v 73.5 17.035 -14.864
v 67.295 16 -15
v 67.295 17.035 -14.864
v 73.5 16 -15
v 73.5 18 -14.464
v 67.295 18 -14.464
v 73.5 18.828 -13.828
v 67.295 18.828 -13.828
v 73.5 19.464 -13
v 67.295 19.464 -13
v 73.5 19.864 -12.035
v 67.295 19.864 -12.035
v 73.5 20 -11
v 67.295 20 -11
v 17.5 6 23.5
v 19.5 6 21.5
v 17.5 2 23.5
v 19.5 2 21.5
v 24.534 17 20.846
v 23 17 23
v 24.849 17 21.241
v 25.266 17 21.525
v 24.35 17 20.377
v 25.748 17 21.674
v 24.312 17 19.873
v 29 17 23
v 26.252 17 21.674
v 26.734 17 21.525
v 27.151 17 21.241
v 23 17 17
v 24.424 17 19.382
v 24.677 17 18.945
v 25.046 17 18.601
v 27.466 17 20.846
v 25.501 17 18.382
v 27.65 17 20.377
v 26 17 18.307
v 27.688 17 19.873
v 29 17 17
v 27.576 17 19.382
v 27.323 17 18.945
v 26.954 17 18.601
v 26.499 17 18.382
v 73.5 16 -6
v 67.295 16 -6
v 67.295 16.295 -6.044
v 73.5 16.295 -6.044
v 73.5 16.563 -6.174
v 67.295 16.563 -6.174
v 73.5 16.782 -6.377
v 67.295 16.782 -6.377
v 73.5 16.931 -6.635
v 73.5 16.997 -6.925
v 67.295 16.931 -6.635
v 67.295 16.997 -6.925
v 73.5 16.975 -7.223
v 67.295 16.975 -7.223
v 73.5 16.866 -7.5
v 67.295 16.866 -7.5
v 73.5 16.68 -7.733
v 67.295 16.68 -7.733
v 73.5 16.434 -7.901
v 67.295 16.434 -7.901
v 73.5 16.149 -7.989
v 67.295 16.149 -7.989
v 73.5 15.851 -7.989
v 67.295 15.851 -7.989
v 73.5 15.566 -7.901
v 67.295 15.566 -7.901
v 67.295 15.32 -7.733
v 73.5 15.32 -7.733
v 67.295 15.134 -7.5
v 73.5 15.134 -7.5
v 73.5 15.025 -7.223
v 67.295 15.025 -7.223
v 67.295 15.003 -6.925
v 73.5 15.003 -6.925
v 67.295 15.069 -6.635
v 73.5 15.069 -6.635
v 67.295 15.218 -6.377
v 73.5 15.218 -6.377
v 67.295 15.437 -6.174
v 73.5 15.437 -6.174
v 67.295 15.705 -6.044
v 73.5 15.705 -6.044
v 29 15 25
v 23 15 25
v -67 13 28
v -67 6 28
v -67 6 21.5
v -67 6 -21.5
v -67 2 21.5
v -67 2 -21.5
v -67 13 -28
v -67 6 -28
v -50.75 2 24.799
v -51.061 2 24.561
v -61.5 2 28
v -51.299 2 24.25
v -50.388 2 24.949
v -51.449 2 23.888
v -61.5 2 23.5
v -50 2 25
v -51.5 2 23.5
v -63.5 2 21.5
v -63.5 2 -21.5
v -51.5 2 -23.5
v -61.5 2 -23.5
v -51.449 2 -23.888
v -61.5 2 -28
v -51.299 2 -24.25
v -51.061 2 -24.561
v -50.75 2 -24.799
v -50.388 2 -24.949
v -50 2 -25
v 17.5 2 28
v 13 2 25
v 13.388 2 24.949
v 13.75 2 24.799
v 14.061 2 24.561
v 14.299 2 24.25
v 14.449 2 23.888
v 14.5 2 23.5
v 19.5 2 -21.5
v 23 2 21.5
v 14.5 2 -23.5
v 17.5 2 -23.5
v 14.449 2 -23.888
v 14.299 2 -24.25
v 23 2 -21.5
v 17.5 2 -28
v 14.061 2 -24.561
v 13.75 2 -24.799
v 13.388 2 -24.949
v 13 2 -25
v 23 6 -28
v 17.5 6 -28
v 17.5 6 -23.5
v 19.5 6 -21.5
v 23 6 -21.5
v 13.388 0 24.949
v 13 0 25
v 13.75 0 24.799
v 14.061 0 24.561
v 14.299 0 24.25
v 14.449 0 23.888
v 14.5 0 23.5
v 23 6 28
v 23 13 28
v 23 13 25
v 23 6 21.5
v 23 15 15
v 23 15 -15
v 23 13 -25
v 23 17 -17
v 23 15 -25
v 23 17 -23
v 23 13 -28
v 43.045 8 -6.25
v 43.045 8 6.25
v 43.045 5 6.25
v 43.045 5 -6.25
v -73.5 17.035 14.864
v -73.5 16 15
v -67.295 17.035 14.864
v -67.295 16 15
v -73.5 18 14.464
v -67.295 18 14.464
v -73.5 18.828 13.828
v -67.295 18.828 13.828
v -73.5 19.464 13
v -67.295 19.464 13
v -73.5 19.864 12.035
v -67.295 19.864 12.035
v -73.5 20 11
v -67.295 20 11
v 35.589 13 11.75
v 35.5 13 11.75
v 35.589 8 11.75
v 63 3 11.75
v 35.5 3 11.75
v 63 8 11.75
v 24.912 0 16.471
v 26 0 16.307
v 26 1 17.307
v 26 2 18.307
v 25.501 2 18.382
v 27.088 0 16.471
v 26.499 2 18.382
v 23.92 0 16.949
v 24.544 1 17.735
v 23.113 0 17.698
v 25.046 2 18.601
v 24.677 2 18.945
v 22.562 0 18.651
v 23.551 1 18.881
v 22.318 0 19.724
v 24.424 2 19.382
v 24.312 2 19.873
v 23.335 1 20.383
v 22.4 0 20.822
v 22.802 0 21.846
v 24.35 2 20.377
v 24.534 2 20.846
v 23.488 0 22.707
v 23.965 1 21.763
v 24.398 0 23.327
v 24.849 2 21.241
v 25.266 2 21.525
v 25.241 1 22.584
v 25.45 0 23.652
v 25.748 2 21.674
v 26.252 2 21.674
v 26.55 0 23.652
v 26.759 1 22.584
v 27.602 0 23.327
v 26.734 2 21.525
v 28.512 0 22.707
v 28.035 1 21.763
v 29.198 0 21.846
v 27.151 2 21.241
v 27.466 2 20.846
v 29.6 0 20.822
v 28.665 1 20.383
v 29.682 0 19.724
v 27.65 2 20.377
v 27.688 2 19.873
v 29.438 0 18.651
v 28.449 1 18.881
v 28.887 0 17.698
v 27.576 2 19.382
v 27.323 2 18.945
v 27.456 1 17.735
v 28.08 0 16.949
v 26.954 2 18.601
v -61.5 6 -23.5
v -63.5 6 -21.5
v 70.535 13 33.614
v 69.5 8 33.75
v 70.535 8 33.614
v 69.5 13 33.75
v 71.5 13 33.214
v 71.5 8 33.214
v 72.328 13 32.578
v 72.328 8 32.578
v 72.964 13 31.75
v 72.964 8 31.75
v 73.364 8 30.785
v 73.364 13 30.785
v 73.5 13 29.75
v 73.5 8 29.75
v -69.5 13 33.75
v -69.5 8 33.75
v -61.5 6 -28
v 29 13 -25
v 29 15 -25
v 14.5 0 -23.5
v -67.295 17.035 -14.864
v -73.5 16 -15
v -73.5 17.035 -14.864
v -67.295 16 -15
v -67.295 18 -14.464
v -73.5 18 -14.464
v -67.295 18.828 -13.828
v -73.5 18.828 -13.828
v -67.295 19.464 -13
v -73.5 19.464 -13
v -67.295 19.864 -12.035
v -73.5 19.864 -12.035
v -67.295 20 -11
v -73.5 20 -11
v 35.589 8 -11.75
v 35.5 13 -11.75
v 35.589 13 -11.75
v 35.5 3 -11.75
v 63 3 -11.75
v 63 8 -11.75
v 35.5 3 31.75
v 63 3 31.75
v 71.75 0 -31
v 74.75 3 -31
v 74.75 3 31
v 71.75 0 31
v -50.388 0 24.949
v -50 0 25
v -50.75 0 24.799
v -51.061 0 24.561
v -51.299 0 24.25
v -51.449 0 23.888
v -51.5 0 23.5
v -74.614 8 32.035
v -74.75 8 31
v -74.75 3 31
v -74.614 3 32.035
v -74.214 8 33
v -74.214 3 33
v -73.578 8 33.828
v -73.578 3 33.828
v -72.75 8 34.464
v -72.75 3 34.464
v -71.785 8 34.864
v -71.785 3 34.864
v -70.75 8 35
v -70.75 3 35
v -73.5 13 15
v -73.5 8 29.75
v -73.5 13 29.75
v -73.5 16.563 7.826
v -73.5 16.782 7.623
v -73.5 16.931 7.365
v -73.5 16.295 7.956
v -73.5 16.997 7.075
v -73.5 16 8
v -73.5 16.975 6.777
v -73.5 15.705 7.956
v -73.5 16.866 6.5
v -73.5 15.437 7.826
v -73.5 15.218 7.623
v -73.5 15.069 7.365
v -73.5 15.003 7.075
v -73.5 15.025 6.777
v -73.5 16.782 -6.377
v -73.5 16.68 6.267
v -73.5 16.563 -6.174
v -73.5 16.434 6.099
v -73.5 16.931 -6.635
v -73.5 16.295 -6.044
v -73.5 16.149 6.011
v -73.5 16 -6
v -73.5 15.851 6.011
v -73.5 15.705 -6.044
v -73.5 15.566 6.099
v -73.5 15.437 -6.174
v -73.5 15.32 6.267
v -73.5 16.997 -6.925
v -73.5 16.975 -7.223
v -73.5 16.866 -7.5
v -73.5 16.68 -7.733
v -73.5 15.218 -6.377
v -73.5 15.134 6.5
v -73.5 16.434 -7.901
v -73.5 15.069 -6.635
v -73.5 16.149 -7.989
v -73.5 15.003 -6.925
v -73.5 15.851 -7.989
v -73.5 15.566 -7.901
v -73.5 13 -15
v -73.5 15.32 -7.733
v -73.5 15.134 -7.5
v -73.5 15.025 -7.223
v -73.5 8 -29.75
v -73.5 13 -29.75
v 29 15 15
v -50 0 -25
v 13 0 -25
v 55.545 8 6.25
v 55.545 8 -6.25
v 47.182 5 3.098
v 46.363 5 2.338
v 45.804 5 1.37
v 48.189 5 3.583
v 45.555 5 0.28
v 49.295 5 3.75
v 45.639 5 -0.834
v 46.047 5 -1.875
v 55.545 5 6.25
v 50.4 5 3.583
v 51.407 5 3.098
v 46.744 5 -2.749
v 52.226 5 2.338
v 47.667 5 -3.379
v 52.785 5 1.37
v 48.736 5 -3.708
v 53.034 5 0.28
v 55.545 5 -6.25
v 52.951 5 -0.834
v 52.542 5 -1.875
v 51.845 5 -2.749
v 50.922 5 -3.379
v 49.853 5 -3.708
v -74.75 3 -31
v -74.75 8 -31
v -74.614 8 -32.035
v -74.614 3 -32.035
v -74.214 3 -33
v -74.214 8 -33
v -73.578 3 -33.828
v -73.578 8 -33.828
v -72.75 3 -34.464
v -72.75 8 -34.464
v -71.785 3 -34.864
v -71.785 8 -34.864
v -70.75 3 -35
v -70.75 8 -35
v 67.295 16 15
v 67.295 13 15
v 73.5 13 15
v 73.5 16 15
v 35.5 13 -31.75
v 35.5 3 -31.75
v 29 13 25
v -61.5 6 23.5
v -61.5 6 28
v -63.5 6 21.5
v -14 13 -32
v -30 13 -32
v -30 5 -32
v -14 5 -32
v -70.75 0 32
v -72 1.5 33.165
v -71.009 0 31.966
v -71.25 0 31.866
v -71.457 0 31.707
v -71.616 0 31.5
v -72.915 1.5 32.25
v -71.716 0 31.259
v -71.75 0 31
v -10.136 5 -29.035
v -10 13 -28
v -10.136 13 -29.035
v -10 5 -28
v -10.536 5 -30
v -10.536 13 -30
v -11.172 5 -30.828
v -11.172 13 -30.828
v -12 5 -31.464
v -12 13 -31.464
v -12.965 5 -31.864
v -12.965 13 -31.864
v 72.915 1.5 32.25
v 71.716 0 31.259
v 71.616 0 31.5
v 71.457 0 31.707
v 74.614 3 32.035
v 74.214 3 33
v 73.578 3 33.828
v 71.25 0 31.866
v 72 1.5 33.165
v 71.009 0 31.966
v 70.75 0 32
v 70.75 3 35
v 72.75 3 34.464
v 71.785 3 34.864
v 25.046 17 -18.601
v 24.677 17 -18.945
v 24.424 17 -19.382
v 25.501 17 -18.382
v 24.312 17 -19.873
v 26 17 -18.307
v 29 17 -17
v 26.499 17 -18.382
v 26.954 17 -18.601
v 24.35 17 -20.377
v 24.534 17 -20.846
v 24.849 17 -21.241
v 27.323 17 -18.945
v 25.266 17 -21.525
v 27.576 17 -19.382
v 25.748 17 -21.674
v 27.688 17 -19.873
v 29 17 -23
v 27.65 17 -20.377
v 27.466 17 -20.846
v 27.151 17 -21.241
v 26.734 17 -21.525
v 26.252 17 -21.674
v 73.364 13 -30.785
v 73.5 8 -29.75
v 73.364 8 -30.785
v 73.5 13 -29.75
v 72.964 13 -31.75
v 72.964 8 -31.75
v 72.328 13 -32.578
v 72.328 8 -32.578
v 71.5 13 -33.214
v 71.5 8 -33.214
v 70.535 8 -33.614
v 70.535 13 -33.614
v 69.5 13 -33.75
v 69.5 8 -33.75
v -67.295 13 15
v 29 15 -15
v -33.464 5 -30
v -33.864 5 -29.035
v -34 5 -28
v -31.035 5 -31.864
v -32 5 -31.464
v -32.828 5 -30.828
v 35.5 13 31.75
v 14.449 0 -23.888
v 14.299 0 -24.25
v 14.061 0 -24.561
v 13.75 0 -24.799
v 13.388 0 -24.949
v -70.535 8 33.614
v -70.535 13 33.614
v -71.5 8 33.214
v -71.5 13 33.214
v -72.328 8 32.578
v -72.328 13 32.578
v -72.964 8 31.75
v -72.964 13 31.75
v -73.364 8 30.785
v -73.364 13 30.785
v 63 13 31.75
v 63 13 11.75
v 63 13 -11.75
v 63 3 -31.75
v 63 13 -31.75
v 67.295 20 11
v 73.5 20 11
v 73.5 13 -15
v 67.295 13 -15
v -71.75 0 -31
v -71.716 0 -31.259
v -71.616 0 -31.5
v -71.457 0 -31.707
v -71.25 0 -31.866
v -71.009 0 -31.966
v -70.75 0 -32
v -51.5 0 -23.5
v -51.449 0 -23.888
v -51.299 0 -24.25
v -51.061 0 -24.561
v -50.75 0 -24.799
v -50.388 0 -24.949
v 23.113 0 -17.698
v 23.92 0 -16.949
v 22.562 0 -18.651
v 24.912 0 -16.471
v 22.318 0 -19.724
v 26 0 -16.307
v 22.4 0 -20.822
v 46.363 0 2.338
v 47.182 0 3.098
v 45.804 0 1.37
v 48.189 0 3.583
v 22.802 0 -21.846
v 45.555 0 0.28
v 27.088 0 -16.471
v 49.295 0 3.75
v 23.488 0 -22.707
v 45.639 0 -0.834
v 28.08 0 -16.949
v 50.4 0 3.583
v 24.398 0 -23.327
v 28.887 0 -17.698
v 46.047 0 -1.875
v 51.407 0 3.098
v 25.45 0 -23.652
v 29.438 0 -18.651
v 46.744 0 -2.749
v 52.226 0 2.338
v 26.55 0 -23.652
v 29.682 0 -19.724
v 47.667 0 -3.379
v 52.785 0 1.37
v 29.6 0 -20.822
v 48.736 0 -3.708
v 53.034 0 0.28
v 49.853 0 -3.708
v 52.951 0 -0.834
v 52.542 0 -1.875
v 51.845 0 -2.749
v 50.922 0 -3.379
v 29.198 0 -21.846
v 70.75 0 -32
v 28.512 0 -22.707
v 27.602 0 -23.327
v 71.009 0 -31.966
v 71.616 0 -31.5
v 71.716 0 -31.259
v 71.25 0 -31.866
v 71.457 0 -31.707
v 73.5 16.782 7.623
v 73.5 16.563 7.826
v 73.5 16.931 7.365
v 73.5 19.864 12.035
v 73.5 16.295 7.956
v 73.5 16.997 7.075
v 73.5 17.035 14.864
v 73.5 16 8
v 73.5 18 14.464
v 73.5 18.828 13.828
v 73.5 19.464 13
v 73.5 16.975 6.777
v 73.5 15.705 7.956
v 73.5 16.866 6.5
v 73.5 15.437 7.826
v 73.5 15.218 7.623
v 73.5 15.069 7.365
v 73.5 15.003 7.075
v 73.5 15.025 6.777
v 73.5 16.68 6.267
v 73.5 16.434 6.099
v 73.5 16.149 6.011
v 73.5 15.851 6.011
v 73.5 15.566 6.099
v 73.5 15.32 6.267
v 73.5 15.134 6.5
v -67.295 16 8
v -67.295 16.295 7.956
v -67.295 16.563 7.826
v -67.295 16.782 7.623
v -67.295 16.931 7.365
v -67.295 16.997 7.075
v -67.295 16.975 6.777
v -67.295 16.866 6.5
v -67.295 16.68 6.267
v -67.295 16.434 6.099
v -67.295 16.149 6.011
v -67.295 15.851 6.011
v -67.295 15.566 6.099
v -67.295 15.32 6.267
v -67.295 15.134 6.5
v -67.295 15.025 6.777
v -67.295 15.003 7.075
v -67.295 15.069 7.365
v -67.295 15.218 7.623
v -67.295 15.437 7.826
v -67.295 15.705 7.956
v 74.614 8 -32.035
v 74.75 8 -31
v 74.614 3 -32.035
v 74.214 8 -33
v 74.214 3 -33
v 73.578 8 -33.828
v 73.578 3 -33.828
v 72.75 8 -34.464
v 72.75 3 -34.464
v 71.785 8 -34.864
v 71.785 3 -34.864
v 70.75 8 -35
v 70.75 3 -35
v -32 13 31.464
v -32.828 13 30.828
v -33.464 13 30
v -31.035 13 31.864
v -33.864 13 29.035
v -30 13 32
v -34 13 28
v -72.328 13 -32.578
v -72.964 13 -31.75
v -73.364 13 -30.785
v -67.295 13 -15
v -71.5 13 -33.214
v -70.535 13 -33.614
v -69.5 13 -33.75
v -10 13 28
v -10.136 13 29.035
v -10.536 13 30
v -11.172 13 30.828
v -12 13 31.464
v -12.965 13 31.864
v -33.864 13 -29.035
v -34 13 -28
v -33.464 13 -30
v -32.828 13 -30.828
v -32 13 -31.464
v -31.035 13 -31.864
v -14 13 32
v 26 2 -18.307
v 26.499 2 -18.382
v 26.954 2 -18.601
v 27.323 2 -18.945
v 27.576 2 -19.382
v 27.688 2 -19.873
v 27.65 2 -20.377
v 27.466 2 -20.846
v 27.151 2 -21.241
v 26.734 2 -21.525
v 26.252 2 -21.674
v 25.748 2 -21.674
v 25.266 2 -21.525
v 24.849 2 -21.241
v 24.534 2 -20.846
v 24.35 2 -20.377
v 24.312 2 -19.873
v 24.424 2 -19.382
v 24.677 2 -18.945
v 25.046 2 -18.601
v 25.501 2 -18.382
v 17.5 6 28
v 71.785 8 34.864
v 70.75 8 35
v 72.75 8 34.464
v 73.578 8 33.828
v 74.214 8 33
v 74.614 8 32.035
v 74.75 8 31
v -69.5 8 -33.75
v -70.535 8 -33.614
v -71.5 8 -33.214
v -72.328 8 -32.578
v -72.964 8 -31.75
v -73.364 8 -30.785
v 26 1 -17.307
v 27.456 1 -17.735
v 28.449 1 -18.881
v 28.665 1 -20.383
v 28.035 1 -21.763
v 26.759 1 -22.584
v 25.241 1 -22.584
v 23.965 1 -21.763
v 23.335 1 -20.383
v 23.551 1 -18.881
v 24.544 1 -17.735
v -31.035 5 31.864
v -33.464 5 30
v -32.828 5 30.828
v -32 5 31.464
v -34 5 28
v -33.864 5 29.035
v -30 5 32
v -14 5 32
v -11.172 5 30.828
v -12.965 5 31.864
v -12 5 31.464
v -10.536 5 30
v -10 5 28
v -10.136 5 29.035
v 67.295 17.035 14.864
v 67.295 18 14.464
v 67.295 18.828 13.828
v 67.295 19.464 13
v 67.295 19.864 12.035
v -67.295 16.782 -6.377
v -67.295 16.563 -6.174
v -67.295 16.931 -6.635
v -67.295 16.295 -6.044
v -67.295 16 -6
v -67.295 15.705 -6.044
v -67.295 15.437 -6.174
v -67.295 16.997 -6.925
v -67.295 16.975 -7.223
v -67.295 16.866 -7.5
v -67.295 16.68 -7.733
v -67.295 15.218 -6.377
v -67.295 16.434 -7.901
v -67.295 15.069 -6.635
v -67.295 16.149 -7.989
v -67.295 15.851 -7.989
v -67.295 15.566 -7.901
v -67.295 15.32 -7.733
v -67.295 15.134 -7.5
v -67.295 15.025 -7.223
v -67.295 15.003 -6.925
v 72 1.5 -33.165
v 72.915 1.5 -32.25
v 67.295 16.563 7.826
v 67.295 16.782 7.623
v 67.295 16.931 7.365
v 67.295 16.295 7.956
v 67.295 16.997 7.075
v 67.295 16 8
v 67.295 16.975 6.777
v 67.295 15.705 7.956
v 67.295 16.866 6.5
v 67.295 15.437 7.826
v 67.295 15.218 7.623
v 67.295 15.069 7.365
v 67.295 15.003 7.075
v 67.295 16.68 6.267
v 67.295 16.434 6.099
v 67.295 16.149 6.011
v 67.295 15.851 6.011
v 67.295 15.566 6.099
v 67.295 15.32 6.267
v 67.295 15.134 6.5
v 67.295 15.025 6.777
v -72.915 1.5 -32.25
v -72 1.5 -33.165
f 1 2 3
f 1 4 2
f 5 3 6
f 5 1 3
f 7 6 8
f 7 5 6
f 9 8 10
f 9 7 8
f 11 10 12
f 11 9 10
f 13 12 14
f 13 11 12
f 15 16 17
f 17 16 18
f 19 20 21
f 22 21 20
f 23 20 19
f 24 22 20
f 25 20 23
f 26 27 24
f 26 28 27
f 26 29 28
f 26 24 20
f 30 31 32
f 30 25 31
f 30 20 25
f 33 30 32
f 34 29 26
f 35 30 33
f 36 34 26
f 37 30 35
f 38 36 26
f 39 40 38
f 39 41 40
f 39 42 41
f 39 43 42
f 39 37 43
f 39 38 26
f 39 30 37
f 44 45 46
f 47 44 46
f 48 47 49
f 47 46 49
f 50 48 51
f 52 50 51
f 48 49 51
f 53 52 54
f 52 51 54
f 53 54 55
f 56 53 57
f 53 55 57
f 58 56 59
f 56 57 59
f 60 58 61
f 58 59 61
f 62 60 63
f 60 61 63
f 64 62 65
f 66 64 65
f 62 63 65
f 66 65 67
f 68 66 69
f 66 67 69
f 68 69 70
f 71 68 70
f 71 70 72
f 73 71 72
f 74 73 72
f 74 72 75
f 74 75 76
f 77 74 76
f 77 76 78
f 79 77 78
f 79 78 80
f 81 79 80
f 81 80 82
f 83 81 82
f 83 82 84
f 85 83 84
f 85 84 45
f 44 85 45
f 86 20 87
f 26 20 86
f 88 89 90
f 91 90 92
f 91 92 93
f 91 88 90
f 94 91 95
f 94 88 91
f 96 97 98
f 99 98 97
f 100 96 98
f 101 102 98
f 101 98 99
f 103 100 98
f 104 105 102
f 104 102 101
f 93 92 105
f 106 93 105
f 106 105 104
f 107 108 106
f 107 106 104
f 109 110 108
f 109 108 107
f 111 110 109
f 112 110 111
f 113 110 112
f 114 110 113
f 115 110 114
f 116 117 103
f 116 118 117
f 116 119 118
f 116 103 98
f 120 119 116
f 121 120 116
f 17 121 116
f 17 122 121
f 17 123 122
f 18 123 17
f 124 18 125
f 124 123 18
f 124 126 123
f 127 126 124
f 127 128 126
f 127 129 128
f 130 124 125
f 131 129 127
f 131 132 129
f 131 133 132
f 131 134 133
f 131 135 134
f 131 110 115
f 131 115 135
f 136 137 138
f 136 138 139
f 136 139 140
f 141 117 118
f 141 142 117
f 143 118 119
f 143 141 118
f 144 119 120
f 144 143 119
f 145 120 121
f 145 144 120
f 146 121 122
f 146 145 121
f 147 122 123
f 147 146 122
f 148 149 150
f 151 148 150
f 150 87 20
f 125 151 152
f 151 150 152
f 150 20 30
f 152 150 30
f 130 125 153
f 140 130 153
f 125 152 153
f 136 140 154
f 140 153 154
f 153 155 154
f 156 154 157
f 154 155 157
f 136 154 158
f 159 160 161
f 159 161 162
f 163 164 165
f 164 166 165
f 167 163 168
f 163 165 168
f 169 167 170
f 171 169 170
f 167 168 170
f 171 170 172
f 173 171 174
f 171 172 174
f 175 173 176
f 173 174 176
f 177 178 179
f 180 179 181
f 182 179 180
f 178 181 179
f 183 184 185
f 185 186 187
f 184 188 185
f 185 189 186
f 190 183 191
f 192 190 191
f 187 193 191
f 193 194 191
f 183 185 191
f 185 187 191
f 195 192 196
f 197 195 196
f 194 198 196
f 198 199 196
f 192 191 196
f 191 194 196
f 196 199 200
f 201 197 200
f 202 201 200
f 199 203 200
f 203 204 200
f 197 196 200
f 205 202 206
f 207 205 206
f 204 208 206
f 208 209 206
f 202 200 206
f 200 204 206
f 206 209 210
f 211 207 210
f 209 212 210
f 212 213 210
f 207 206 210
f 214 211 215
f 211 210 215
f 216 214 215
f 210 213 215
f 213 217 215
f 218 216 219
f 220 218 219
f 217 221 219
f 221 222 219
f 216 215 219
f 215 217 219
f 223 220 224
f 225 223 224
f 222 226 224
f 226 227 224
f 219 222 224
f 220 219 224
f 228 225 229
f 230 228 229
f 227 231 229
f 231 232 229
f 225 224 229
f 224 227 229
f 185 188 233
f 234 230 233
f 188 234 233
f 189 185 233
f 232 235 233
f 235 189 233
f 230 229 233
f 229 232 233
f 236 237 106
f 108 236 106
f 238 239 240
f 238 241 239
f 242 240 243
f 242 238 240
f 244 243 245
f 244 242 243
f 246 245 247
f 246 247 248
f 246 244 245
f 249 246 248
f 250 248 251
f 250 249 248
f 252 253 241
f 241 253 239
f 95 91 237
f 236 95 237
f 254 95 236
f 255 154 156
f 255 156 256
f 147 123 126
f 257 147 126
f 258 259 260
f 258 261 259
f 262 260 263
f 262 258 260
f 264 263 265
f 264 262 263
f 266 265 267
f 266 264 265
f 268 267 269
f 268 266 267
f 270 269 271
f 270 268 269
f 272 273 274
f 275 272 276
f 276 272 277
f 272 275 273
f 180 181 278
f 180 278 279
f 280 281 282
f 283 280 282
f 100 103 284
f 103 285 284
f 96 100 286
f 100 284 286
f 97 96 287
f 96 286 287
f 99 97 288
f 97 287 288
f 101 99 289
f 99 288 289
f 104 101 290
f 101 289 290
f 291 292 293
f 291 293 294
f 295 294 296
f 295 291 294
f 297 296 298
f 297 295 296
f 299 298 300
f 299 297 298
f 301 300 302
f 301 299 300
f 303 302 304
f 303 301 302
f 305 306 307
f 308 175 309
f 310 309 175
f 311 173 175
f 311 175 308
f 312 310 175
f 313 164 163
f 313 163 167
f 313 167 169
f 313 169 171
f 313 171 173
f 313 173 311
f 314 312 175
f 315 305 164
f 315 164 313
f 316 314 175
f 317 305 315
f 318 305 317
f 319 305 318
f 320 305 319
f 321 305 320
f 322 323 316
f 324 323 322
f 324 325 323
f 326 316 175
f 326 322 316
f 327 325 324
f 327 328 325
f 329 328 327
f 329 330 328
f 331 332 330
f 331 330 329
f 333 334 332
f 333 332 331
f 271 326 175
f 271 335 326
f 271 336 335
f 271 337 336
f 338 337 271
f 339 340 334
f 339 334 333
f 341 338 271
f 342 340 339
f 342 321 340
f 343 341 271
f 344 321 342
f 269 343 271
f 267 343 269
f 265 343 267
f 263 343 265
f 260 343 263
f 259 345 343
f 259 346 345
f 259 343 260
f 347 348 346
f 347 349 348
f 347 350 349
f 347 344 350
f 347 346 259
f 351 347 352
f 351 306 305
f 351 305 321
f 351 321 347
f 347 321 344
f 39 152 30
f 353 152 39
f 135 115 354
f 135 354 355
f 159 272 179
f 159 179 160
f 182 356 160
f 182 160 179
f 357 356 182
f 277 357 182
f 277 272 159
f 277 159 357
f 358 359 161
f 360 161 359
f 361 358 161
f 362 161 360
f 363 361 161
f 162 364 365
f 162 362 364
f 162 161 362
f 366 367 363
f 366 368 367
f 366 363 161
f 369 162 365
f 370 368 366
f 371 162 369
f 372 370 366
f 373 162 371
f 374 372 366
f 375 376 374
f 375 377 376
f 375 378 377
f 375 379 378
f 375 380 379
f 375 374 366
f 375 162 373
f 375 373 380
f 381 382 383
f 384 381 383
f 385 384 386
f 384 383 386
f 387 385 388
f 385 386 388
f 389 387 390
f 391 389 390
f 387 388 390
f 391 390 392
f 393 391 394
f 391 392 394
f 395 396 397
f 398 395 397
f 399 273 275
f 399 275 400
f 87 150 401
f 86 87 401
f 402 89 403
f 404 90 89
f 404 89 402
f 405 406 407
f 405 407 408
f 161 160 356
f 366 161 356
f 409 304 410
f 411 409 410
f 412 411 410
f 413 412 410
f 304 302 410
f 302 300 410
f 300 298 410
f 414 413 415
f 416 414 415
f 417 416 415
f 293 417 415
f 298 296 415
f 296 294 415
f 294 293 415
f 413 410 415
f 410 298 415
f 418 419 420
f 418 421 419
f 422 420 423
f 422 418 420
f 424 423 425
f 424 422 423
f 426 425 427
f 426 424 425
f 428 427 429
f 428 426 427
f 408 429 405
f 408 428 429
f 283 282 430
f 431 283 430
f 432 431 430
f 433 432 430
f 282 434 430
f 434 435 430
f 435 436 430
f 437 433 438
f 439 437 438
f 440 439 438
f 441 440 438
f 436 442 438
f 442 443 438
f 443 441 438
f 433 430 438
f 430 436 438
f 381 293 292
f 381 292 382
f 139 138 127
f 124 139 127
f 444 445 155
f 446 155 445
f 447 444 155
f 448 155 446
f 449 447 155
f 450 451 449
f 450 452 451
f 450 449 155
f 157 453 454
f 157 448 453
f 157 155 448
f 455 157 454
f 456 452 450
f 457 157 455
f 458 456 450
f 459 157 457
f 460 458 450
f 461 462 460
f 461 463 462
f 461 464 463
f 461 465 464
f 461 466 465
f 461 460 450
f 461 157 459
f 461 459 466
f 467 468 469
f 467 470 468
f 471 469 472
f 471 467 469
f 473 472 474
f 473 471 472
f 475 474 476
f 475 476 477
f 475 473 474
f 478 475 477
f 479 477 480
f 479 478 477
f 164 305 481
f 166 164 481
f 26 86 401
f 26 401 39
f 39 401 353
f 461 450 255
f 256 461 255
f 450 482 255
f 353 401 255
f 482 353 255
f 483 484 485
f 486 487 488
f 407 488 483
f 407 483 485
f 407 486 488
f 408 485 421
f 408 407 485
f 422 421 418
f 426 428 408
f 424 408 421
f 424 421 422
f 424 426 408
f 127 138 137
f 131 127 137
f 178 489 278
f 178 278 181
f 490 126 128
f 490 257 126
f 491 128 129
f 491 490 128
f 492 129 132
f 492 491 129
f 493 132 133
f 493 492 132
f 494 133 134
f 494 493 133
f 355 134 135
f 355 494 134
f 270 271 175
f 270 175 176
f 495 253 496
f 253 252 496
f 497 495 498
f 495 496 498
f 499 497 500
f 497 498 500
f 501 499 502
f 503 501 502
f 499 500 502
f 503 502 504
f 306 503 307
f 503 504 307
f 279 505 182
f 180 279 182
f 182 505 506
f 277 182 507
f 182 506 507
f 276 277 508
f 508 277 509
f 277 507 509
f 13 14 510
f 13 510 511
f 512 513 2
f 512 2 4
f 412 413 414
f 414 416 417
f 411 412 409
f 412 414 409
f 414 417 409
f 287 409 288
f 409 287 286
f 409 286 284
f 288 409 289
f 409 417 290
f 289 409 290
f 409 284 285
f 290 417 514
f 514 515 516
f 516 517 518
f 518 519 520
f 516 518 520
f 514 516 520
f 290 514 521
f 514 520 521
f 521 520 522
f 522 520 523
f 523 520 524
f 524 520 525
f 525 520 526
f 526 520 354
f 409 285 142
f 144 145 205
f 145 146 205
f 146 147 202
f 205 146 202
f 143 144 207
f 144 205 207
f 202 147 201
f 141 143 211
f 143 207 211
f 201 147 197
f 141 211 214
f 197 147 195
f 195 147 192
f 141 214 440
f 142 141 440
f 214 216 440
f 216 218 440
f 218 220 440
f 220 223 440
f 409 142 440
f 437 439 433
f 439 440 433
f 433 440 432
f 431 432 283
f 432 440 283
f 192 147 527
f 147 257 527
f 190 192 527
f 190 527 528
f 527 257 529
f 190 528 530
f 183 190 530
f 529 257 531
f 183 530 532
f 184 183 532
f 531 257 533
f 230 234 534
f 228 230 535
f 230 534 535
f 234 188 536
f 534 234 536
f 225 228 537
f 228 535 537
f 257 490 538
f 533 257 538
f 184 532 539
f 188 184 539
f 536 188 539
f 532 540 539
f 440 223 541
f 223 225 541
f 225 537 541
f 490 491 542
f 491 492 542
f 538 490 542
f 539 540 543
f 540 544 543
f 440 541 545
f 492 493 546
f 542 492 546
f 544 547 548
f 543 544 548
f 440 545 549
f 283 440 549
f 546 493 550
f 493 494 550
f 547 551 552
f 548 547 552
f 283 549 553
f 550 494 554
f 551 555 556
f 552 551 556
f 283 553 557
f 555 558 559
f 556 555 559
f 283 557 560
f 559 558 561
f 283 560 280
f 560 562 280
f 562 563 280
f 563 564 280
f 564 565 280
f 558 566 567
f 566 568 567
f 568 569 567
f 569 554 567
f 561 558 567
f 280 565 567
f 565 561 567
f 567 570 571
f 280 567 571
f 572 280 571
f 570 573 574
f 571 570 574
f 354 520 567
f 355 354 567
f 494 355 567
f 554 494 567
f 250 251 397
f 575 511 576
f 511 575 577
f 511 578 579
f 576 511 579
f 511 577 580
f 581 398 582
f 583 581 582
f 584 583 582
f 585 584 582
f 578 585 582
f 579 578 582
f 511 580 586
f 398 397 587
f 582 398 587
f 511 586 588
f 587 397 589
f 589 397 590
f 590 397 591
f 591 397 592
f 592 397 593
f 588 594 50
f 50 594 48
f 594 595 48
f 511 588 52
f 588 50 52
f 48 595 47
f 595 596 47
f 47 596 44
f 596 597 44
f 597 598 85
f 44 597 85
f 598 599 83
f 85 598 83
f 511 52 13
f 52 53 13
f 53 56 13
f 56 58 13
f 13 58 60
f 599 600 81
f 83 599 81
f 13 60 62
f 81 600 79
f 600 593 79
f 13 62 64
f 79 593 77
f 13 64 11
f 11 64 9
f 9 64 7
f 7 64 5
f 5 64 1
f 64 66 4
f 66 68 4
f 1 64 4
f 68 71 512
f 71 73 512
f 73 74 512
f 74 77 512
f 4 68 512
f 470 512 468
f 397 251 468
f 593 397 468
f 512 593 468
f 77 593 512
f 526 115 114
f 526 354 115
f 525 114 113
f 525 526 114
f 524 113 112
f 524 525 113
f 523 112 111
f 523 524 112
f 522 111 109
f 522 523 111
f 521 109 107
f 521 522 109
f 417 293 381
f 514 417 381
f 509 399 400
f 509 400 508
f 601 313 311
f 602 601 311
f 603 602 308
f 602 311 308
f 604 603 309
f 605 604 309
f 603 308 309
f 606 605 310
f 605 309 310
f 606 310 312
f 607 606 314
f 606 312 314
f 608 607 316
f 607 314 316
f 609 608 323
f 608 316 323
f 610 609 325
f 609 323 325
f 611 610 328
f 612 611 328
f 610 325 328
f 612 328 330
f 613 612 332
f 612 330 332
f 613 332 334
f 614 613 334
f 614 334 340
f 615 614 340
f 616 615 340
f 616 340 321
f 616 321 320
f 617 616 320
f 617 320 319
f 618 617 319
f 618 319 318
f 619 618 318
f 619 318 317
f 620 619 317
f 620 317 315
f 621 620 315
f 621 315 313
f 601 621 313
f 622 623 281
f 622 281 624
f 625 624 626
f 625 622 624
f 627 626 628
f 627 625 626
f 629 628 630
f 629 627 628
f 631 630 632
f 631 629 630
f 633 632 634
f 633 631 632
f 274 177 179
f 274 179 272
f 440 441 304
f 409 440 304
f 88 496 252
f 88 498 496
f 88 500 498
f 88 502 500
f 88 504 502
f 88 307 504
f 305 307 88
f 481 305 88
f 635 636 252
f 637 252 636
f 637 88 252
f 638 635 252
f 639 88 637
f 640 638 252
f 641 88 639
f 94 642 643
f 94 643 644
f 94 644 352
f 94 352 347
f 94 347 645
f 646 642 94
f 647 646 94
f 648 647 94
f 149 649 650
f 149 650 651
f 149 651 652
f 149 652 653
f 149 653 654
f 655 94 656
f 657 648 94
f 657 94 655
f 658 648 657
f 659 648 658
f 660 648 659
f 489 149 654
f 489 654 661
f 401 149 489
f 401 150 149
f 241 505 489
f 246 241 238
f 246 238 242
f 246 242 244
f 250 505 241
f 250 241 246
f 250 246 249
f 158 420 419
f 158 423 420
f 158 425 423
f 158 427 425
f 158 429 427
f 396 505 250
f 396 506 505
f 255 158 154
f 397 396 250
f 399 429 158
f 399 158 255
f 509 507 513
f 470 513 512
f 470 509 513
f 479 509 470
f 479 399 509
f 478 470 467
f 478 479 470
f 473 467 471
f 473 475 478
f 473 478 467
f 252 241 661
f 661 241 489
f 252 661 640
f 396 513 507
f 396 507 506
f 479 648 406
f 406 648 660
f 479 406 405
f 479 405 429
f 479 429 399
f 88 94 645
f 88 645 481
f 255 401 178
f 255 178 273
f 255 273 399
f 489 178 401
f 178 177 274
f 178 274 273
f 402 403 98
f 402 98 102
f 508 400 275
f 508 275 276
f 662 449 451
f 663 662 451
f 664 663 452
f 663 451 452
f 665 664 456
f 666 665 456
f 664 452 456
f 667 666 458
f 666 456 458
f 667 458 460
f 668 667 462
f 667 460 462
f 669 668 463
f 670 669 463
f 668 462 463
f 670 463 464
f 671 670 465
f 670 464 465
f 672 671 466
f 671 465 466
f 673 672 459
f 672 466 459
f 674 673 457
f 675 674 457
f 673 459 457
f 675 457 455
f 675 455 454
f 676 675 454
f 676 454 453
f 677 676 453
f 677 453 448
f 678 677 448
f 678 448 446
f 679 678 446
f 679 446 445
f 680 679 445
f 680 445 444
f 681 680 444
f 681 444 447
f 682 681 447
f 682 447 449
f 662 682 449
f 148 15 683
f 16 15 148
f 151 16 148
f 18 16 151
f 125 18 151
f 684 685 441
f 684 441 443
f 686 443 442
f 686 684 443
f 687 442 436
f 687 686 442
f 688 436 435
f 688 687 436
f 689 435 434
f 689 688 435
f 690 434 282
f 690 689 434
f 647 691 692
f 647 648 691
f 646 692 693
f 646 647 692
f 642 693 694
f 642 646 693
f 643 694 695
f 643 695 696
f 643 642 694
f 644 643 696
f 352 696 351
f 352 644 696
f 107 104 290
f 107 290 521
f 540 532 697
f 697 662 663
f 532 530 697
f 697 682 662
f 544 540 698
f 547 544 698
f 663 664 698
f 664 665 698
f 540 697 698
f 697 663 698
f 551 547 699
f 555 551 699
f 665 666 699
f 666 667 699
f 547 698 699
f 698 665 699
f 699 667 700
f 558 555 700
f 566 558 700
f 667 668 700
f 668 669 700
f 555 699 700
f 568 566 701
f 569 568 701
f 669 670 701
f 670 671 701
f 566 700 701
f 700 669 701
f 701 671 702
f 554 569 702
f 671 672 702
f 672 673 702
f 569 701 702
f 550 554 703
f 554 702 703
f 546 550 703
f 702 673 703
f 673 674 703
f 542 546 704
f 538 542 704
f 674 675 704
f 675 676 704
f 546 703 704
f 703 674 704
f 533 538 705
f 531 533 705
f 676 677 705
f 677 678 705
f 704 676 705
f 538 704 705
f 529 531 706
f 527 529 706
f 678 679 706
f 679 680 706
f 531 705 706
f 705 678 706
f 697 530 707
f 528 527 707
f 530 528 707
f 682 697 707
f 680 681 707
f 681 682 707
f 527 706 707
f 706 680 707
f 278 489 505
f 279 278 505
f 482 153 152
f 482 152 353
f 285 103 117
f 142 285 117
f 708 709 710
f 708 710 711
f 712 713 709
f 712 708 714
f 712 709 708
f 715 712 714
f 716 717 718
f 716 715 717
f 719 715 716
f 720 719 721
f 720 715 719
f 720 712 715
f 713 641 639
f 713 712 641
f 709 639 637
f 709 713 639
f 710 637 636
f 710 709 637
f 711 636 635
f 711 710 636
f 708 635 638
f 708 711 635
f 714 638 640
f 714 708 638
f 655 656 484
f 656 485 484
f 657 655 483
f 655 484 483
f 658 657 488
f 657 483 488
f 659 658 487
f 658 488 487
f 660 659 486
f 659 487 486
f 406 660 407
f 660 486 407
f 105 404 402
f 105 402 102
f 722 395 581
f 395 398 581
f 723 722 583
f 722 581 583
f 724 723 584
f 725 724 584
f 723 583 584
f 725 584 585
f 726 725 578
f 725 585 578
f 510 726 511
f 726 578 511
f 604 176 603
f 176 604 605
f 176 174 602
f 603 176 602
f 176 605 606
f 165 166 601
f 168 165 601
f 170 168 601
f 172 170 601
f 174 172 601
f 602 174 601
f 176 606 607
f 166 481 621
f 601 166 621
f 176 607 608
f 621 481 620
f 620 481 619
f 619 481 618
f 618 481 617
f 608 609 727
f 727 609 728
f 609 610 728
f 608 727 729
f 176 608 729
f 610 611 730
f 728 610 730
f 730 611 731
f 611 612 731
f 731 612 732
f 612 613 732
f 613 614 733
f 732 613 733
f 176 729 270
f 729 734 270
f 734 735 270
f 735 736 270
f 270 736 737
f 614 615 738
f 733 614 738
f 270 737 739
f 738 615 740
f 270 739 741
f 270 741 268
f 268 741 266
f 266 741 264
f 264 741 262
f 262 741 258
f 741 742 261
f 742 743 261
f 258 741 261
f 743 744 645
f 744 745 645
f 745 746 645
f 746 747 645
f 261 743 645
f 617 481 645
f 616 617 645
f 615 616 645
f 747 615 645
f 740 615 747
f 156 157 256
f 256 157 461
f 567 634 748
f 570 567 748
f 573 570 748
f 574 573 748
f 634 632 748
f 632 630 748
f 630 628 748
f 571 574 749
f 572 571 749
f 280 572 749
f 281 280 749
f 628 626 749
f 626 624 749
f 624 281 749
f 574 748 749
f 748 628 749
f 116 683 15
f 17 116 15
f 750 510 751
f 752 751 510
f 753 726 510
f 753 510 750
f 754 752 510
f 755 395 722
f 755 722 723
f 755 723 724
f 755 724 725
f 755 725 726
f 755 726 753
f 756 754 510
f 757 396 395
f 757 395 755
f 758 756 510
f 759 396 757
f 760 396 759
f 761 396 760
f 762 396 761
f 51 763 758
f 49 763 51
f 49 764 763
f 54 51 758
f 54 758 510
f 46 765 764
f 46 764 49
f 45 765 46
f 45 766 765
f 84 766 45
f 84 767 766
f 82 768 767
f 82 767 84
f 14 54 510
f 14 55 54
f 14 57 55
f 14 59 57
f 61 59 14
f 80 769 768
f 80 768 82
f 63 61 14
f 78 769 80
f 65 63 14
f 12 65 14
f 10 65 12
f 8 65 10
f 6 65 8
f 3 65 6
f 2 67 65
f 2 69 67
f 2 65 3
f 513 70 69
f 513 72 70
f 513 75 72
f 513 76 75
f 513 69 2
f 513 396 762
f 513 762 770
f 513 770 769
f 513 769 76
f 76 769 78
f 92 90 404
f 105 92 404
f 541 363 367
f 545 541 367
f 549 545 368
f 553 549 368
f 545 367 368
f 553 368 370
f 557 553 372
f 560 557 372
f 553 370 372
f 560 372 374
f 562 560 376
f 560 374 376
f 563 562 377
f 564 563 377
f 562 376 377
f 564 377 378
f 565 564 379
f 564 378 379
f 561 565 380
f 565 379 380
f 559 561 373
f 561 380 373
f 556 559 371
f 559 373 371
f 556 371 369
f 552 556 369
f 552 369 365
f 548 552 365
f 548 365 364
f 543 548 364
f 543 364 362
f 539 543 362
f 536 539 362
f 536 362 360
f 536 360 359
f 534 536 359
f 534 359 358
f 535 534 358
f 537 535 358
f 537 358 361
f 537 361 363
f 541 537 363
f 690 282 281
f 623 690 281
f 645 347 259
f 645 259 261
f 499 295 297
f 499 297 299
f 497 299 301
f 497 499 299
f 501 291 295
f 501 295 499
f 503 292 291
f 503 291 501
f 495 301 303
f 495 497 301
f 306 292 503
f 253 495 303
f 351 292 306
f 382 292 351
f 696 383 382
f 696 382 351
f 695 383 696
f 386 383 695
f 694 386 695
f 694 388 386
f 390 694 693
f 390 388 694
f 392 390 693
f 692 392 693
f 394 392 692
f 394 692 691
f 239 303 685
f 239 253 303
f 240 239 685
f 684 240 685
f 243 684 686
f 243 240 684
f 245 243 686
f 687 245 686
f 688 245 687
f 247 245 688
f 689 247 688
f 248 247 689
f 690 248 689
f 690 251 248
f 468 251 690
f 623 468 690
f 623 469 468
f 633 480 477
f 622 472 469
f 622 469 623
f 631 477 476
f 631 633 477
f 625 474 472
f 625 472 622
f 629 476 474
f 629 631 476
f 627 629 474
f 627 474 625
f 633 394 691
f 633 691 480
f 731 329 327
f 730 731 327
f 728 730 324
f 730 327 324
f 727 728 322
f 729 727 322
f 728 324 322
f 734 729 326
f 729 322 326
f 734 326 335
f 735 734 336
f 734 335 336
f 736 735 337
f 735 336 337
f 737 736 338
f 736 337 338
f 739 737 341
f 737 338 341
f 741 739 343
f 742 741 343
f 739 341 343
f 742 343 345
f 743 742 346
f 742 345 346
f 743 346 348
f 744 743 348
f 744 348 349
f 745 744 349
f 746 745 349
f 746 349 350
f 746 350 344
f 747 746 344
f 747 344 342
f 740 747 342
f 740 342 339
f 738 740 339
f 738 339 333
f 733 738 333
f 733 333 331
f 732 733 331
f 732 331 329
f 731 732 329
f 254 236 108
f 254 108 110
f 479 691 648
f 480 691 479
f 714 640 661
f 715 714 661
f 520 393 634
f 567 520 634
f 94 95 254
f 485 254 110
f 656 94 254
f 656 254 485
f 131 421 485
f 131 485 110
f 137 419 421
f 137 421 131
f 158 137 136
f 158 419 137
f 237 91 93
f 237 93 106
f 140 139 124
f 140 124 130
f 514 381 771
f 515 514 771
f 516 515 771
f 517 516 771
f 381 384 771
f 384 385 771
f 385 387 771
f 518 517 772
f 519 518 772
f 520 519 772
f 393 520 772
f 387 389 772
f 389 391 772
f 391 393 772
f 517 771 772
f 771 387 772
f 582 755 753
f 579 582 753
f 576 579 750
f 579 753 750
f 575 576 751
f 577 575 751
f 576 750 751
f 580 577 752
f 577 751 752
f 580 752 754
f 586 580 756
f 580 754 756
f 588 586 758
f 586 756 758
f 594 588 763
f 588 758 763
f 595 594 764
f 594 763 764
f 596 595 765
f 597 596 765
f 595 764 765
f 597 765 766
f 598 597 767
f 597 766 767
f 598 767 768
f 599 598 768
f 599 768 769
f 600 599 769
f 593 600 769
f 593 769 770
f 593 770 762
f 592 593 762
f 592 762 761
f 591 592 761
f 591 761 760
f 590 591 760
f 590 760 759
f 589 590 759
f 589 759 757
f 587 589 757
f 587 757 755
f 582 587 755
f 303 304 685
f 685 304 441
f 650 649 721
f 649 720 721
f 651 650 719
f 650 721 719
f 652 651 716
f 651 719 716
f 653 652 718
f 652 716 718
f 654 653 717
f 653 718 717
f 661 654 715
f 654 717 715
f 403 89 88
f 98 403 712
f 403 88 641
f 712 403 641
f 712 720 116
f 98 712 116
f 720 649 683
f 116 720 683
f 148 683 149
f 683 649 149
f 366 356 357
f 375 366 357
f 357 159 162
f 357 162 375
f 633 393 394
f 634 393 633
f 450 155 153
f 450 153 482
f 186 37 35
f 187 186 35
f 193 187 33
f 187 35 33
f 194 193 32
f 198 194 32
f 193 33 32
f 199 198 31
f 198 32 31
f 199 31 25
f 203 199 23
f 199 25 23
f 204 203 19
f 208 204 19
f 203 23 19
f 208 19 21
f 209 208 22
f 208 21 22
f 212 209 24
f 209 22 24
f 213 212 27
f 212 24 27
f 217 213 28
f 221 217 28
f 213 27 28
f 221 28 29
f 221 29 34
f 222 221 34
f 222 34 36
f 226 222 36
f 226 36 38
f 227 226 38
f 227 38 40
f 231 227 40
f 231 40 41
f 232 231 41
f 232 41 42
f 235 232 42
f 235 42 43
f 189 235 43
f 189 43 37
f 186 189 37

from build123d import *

# Parameters (mm, degrees)
SKETCH1_W           = 149.5
SKETCH1_H           = 70
BOSS_EXTRUDE1_DEPTH = 8
FILLET1_R           = 4
SKETCH6_W           = 147
SKETCH6_H           = 67.5
BOSS_EXTRUDE3_DEPTH = 5
FILLET2_R           = 4
SKETCH7_W           = 6.205469591
SKETCH7_H           = 30
BOSS_EXTRUDE4_DEPTH = 7
SKETCH8_R           = 1
CUT_EXTRUDE3_DEPTH  = 154.632882223
FILLET5_R           = 4
SKETCH9_W           = 90
SKETCH9_H           = 56
CUT_EXTRUDE4_DEPTH  = 7
SKETCH10_W          = 79
SKETCH10_H          = 56
CUT_EXTRUDE5_DEPTH  = 4
SKETCH11_W          = 66
SKETCH11_H          = 50
CUT_EXTRUDE6_DEPTH  = 85.478177656
SKETCH13_W          = 6
SKETCH13_H          = 50
BOSS_EXTRUDE5_DEPTH = 4
SKETCH14_R          = 1.692809378
CUT_EXTRUDE7_DEPTH  = 85.270768953
SKETCH15_W          = 6
SKETCH15_H          = 30
CUT_EXTRUDE8_DEPTH  = 2
CHAMFER2_SIZE       = 2
SKETCH16_R          = 3.75
CUT_EXTRUDE9_DEPTH  = 84.555744865
SKETCH17_W          = 12.5
SKETCH17_H          = 12.5
CUT_EXTRUDE10_DEPTH = 8
SKETCH20_W          = 24
SKETCH20_H          = 4
CUT_EXTRUDE12_DEPTH = 8
FILLET6_R           = 4
CHAMFER3_SIZE       = 2
SKETCH23_W          = 5.5
SKETCH23_H          = 43
CUT_EXTRUDE15_DEPTH = 4
FILLET7_R           = 1.5
CHAMFER6_SIZE       = 2
SKETCH26_W          = 27.5
SKETCH26_H          = 20
CUT_EXTRUDE16_DEPTH = 10
SKETCH27_W          = 27.410939183
SKETCH27_H          = 28.83766823
CUT_EXTRUDE17_DEPTH = 5
CHAMFER7_SIZE       = 3


with BuildPart() as part:
    # Sketch1 → Boss-Extrude1 (new body)
    with BuildSketch(Plane(origin=(0, 0, 0), x_dir=(1, 0, 0), z_dir=(0, 1, 0))):
        Rectangle(SKETCH1_W, SKETCH1_H)
    extrude(amount=BOSS_EXTRUDE1_DEPTH)

    # Fillet1
    fillet1_edges = [part.edges().sort_by_distance(p)[0] for p in [
        (74.75, 4, 35),
        (-74.75, 4, 35),
        (-74.75, 4, -35),
        (74.75, 4, -35),
    ]]
    fillet(fillet1_edges, radius=FILLET1_R)

    # Sketch6 → Boss-Extrude3 (add)
    with BuildSketch(Plane(origin=(0, 8, 0), x_dir=(1, 0, 0), z_dir=(0, 1, 0))):
        Rectangle(SKETCH6_W, SKETCH6_H)
    extrude(amount=BOSS_EXTRUDE3_DEPTH)

    # Fillet2
    fillet2_edges = [part.edges().sort_by_distance(p)[0] for p in [
        (73.5, 10.5, 33.75),
        (73.5, 10.5, -33.75),
        (-73.5, 10.5, -33.75),
        (-73.5, 10.5, 33.75),
    ]]
    fillet(fillet2_edges, radius=FILLET2_R)

    # Sketch7 → Boss-Extrude4 (add)
    with BuildSketch(Plane(origin=(0, 13, 0), x_dir=(1, 0, 0), z_dir=(0, 1, 0))):
        with Locations((-70.397265205, 0)):
            Rectangle(SKETCH7_W, SKETCH7_H)
        with Locations((70.397265205, 0)):
            Rectangle(SKETCH7_W, SKETCH7_H)
    extrude(amount=BOSS_EXTRUDE4_DEPTH)

    # Sketch8 → Cut-Extrude3 (cut, through all)
    with BuildSketch(Plane.ZY.offset(73.5)):
        with Locations((-7, 16)):
            Circle(SKETCH8_R)
        with Locations((7, 16)):
            Circle(SKETCH8_R)
    extrude(amount=-CUT_EXTRUDE3_DEPTH, mode=Mode.SUBTRACT)

    # Fillet5
    fillet5_edges = [part.edges().sort_by_distance(p)[0] for p in [
        (-70.397265204, 20, 15),
        (-70.397265204, 20, -15),
        (70.397265204, 20, -15),
        (70.397265204, 20, 15),
    ]]
    fillet(fillet5_edges, radius=FILLET5_R)

    # Sketch9 → Cut-Extrude4 (cut)
    with BuildSketch(Plane(origin=(0, 13, 0), x_dir=(1, 0, 0), z_dir=(0, 1, 0))):
        with Locations((-22, 0)):
            Rectangle(SKETCH9_W, SKETCH9_H)
    extrude(amount=-CUT_EXTRUDE4_DEPTH, mode=Mode.SUBTRACT)

    # Sketch10 → Cut-Extrude5 (cut)
    with BuildSketch(Plane(origin=(0, 6, 0), x_dir=(1, 0, 0), z_dir=(0, 1, 0))):
        with Locations((-22, 0)):
            Rectangle(SKETCH10_W, SKETCH10_H)
    extrude(amount=-CUT_EXTRUDE5_DEPTH, mode=Mode.SUBTRACT)

    # Sketch11 → Cut-Extrude6 (cut, through all)
    with BuildSketch(Plane(origin=(0, 2, 0), x_dir=(1, 0, 0), z_dir=(0, 1, 0))):
        with Locations((-18.5, 0)):
            Rectangle(SKETCH11_W, SKETCH11_H)
    extrude(amount=-CUT_EXTRUDE6_DEPTH, mode=Mode.SUBTRACT)

    # Sketch13 → Boss-Extrude5 (add)
    with BuildSketch(Plane(origin=(0, 13, 0), x_dir=(1, 0, 0), z_dir=(0, 1, 0))):
        with Locations((26, 0)):
            Rectangle(SKETCH13_W, SKETCH13_H)
    extrude(amount=BOSS_EXTRUDE5_DEPTH)

    # Sketch14 → Cut-Extrude7 (cut, through all)
    with BuildSketch(Plane(origin=(0, 17, 0), x_dir=(1, 0, 0), z_dir=(0, 1, 0))):
        with Locations(Location((26, 20, 0), (0, 0, 270))):
            Circle(SKETCH14_R)
        with Locations(Location((26, -20, 0), (0, 0, 90))):
            Circle(SKETCH14_R)
    extrude(amount=-CUT_EXTRUDE7_DEPTH, mode=Mode.SUBTRACT)

    # Sketch15 → Cut-Extrude8 (cut)
    with BuildSketch(Plane(origin=(0, 17, 0), x_dir=(1, 0, 0), z_dir=(0, 1, 0))):
        with Locations((26, 0)):
            Rectangle(SKETCH15_W, SKETCH15_H)
    extrude(amount=-CUT_EXTRUDE8_DEPTH, mode=Mode.SUBTRACT)

    # Chamfer2
    chamfer2_edges = [part.edges().sort_by_distance(p)[0] for p in [
        (26, 0, -21.692809378),
        (26, 0, 21.692809378),
    ]]
    chamfer(chamfer2_edges, length=CHAMFER2_SIZE)

    # Sketch16 → Cut-Extrude9 (cut, through all)
    with BuildSketch(Plane(origin=(0, 13, 0), x_dir=(1, 0, 0), z_dir=(0, 1, 0))):
        with Locations(Location((49.294530409, 0, 0), (0, 0, 270))):
            Circle(SKETCH16_R)
    extrude(amount=-CUT_EXTRUDE9_DEPTH, mode=Mode.SUBTRACT)

    # Sketch17 → Cut-Extrude10 (cut)
    with BuildSketch(Plane(origin=(0, 13, 0), x_dir=(1, 0, 0), z_dir=(0, 1, 0))):
        with Locations((49.294530409, 0)):
            Rectangle(SKETCH17_W, SKETCH17_H)
    extrude(amount=-CUT_EXTRUDE10_DEPTH, mode=Mode.SUBTRACT)

    # Sketch20 → Cut-Extrude12 (cut)
    with BuildSketch(Plane(origin=(0, 13, 0), x_dir=(1, 0, 0), z_dir=(0, 1, 0))):
        with Locations((-22, 30)):
            Rectangle(SKETCH20_W, SKETCH20_H)
        with Locations((-22, -30)):
            Rectangle(SKETCH20_W, SKETCH20_H)
    extrude(amount=-CUT_EXTRUDE12_DEPTH, mode=Mode.SUBTRACT)

    # Fillet6
    fillet6_edges = [part.edges().sort_by_distance(p)[0] for p in [
        (-34, 9, 32),
        (-10, 9, 32),
        (-10, 9, -32),
        (-34, 9, -32),
    ]]
    fillet(fillet6_edges, radius=FILLET6_R - 0.0001)  # a hair under: the kernel refuses the full size

    # Chamfer3
    chamfer3_edges = [part.edges().sort_by_distance(p)[0] for p in [
        (26, 17, 15),
        (26, 17, -15),
        (26, 17, -25),
        (26, 17, 25),
    ]]
    chamfer(chamfer3_edges, length=CHAMFER3_SIZE - 0.0001)  # a hair under: the kernel refuses the full size

    # Sketch23 → Cut-Extrude15 (cut)
    with BuildSketch(Plane(origin=(0, 6, 0), x_dir=(1, 0, 0), z_dir=(0, 1, 0))):
        with Locations((-64.25, 0)):
            Rectangle(SKETCH23_W, SKETCH23_H)
        with Locations((20.25, 0)):
            Rectangle(SKETCH23_W, SKETCH23_H)
    extrude(amount=-CUT_EXTRUDE15_DEPTH, mode=Mode.SUBTRACT)

    # Fillet7
    fillet7_edges = [part.edges().sort_by_distance(p)[0] for p in [
        (14.5, 1, -25),
        (14.5, 1, 25),
        (-51.5, 1, 25),
        (-51.5, 1, -25),
    ]]
    fillet(fillet7_edges, radius=FILLET7_R)

    # Chamfer6
    chamfer6_edges = [part.edges().sort_by_distance(p)[0] for p in [
        (-61.5, 4, 21.5),
        (-61.5, 4, -21.5),
        (17.5, 4, 21.5),
        (17.5, 4, -21.5),
    ]]
    chamfer(chamfer6_edges, length=CHAMFER6_SIZE)

    # Sketch26 → Cut-Extrude16 (cut)
    with BuildSketch(Plane(origin=(0, 13, 0), x_dir=(1, 0, 0), z_dir=(0, 1, 0))):
        with Locations((49.25, -21.75)):
            Rectangle(SKETCH26_W, SKETCH26_H)
        with Locations((49.25, 21.75)):
            Rectangle(SKETCH26_W, SKETCH26_H)
    extrude(amount=-CUT_EXTRUDE16_DEPTH, mode=Mode.SUBTRACT)

    # Sketch27 → Cut-Extrude17 (cut)
    with BuildSketch(Plane(origin=(0, 13, 0), x_dir=(1, 0, 0), z_dir=(0, 1, 0))):
        with Locations((49.294530409, 0)):
            Rectangle(SKETCH27_W, SKETCH27_H)
    extrude(amount=-CUT_EXTRUDE17_DEPTH, mode=Mode.SUBTRACT)

    # Chamfer7
    chamfer7_edges = [part.edges().sort_by_distance(p)[0] for p in [
        (-74.75, 0, 0),
        (74.75, 0, 0),
        (0, 0, 35),
        (0, 0, -35),
        (73.578427125, 0, 33.828427125),
        (73.578427125, 0, -33.828427125),
        (-73.578427125, 0, 33.828427125),
        (-73.578427125, 0, -33.828427125),
    ]]
    chamfer(chamfer7_edges, length=CHAMFER7_SIZE)


solid = part.part
